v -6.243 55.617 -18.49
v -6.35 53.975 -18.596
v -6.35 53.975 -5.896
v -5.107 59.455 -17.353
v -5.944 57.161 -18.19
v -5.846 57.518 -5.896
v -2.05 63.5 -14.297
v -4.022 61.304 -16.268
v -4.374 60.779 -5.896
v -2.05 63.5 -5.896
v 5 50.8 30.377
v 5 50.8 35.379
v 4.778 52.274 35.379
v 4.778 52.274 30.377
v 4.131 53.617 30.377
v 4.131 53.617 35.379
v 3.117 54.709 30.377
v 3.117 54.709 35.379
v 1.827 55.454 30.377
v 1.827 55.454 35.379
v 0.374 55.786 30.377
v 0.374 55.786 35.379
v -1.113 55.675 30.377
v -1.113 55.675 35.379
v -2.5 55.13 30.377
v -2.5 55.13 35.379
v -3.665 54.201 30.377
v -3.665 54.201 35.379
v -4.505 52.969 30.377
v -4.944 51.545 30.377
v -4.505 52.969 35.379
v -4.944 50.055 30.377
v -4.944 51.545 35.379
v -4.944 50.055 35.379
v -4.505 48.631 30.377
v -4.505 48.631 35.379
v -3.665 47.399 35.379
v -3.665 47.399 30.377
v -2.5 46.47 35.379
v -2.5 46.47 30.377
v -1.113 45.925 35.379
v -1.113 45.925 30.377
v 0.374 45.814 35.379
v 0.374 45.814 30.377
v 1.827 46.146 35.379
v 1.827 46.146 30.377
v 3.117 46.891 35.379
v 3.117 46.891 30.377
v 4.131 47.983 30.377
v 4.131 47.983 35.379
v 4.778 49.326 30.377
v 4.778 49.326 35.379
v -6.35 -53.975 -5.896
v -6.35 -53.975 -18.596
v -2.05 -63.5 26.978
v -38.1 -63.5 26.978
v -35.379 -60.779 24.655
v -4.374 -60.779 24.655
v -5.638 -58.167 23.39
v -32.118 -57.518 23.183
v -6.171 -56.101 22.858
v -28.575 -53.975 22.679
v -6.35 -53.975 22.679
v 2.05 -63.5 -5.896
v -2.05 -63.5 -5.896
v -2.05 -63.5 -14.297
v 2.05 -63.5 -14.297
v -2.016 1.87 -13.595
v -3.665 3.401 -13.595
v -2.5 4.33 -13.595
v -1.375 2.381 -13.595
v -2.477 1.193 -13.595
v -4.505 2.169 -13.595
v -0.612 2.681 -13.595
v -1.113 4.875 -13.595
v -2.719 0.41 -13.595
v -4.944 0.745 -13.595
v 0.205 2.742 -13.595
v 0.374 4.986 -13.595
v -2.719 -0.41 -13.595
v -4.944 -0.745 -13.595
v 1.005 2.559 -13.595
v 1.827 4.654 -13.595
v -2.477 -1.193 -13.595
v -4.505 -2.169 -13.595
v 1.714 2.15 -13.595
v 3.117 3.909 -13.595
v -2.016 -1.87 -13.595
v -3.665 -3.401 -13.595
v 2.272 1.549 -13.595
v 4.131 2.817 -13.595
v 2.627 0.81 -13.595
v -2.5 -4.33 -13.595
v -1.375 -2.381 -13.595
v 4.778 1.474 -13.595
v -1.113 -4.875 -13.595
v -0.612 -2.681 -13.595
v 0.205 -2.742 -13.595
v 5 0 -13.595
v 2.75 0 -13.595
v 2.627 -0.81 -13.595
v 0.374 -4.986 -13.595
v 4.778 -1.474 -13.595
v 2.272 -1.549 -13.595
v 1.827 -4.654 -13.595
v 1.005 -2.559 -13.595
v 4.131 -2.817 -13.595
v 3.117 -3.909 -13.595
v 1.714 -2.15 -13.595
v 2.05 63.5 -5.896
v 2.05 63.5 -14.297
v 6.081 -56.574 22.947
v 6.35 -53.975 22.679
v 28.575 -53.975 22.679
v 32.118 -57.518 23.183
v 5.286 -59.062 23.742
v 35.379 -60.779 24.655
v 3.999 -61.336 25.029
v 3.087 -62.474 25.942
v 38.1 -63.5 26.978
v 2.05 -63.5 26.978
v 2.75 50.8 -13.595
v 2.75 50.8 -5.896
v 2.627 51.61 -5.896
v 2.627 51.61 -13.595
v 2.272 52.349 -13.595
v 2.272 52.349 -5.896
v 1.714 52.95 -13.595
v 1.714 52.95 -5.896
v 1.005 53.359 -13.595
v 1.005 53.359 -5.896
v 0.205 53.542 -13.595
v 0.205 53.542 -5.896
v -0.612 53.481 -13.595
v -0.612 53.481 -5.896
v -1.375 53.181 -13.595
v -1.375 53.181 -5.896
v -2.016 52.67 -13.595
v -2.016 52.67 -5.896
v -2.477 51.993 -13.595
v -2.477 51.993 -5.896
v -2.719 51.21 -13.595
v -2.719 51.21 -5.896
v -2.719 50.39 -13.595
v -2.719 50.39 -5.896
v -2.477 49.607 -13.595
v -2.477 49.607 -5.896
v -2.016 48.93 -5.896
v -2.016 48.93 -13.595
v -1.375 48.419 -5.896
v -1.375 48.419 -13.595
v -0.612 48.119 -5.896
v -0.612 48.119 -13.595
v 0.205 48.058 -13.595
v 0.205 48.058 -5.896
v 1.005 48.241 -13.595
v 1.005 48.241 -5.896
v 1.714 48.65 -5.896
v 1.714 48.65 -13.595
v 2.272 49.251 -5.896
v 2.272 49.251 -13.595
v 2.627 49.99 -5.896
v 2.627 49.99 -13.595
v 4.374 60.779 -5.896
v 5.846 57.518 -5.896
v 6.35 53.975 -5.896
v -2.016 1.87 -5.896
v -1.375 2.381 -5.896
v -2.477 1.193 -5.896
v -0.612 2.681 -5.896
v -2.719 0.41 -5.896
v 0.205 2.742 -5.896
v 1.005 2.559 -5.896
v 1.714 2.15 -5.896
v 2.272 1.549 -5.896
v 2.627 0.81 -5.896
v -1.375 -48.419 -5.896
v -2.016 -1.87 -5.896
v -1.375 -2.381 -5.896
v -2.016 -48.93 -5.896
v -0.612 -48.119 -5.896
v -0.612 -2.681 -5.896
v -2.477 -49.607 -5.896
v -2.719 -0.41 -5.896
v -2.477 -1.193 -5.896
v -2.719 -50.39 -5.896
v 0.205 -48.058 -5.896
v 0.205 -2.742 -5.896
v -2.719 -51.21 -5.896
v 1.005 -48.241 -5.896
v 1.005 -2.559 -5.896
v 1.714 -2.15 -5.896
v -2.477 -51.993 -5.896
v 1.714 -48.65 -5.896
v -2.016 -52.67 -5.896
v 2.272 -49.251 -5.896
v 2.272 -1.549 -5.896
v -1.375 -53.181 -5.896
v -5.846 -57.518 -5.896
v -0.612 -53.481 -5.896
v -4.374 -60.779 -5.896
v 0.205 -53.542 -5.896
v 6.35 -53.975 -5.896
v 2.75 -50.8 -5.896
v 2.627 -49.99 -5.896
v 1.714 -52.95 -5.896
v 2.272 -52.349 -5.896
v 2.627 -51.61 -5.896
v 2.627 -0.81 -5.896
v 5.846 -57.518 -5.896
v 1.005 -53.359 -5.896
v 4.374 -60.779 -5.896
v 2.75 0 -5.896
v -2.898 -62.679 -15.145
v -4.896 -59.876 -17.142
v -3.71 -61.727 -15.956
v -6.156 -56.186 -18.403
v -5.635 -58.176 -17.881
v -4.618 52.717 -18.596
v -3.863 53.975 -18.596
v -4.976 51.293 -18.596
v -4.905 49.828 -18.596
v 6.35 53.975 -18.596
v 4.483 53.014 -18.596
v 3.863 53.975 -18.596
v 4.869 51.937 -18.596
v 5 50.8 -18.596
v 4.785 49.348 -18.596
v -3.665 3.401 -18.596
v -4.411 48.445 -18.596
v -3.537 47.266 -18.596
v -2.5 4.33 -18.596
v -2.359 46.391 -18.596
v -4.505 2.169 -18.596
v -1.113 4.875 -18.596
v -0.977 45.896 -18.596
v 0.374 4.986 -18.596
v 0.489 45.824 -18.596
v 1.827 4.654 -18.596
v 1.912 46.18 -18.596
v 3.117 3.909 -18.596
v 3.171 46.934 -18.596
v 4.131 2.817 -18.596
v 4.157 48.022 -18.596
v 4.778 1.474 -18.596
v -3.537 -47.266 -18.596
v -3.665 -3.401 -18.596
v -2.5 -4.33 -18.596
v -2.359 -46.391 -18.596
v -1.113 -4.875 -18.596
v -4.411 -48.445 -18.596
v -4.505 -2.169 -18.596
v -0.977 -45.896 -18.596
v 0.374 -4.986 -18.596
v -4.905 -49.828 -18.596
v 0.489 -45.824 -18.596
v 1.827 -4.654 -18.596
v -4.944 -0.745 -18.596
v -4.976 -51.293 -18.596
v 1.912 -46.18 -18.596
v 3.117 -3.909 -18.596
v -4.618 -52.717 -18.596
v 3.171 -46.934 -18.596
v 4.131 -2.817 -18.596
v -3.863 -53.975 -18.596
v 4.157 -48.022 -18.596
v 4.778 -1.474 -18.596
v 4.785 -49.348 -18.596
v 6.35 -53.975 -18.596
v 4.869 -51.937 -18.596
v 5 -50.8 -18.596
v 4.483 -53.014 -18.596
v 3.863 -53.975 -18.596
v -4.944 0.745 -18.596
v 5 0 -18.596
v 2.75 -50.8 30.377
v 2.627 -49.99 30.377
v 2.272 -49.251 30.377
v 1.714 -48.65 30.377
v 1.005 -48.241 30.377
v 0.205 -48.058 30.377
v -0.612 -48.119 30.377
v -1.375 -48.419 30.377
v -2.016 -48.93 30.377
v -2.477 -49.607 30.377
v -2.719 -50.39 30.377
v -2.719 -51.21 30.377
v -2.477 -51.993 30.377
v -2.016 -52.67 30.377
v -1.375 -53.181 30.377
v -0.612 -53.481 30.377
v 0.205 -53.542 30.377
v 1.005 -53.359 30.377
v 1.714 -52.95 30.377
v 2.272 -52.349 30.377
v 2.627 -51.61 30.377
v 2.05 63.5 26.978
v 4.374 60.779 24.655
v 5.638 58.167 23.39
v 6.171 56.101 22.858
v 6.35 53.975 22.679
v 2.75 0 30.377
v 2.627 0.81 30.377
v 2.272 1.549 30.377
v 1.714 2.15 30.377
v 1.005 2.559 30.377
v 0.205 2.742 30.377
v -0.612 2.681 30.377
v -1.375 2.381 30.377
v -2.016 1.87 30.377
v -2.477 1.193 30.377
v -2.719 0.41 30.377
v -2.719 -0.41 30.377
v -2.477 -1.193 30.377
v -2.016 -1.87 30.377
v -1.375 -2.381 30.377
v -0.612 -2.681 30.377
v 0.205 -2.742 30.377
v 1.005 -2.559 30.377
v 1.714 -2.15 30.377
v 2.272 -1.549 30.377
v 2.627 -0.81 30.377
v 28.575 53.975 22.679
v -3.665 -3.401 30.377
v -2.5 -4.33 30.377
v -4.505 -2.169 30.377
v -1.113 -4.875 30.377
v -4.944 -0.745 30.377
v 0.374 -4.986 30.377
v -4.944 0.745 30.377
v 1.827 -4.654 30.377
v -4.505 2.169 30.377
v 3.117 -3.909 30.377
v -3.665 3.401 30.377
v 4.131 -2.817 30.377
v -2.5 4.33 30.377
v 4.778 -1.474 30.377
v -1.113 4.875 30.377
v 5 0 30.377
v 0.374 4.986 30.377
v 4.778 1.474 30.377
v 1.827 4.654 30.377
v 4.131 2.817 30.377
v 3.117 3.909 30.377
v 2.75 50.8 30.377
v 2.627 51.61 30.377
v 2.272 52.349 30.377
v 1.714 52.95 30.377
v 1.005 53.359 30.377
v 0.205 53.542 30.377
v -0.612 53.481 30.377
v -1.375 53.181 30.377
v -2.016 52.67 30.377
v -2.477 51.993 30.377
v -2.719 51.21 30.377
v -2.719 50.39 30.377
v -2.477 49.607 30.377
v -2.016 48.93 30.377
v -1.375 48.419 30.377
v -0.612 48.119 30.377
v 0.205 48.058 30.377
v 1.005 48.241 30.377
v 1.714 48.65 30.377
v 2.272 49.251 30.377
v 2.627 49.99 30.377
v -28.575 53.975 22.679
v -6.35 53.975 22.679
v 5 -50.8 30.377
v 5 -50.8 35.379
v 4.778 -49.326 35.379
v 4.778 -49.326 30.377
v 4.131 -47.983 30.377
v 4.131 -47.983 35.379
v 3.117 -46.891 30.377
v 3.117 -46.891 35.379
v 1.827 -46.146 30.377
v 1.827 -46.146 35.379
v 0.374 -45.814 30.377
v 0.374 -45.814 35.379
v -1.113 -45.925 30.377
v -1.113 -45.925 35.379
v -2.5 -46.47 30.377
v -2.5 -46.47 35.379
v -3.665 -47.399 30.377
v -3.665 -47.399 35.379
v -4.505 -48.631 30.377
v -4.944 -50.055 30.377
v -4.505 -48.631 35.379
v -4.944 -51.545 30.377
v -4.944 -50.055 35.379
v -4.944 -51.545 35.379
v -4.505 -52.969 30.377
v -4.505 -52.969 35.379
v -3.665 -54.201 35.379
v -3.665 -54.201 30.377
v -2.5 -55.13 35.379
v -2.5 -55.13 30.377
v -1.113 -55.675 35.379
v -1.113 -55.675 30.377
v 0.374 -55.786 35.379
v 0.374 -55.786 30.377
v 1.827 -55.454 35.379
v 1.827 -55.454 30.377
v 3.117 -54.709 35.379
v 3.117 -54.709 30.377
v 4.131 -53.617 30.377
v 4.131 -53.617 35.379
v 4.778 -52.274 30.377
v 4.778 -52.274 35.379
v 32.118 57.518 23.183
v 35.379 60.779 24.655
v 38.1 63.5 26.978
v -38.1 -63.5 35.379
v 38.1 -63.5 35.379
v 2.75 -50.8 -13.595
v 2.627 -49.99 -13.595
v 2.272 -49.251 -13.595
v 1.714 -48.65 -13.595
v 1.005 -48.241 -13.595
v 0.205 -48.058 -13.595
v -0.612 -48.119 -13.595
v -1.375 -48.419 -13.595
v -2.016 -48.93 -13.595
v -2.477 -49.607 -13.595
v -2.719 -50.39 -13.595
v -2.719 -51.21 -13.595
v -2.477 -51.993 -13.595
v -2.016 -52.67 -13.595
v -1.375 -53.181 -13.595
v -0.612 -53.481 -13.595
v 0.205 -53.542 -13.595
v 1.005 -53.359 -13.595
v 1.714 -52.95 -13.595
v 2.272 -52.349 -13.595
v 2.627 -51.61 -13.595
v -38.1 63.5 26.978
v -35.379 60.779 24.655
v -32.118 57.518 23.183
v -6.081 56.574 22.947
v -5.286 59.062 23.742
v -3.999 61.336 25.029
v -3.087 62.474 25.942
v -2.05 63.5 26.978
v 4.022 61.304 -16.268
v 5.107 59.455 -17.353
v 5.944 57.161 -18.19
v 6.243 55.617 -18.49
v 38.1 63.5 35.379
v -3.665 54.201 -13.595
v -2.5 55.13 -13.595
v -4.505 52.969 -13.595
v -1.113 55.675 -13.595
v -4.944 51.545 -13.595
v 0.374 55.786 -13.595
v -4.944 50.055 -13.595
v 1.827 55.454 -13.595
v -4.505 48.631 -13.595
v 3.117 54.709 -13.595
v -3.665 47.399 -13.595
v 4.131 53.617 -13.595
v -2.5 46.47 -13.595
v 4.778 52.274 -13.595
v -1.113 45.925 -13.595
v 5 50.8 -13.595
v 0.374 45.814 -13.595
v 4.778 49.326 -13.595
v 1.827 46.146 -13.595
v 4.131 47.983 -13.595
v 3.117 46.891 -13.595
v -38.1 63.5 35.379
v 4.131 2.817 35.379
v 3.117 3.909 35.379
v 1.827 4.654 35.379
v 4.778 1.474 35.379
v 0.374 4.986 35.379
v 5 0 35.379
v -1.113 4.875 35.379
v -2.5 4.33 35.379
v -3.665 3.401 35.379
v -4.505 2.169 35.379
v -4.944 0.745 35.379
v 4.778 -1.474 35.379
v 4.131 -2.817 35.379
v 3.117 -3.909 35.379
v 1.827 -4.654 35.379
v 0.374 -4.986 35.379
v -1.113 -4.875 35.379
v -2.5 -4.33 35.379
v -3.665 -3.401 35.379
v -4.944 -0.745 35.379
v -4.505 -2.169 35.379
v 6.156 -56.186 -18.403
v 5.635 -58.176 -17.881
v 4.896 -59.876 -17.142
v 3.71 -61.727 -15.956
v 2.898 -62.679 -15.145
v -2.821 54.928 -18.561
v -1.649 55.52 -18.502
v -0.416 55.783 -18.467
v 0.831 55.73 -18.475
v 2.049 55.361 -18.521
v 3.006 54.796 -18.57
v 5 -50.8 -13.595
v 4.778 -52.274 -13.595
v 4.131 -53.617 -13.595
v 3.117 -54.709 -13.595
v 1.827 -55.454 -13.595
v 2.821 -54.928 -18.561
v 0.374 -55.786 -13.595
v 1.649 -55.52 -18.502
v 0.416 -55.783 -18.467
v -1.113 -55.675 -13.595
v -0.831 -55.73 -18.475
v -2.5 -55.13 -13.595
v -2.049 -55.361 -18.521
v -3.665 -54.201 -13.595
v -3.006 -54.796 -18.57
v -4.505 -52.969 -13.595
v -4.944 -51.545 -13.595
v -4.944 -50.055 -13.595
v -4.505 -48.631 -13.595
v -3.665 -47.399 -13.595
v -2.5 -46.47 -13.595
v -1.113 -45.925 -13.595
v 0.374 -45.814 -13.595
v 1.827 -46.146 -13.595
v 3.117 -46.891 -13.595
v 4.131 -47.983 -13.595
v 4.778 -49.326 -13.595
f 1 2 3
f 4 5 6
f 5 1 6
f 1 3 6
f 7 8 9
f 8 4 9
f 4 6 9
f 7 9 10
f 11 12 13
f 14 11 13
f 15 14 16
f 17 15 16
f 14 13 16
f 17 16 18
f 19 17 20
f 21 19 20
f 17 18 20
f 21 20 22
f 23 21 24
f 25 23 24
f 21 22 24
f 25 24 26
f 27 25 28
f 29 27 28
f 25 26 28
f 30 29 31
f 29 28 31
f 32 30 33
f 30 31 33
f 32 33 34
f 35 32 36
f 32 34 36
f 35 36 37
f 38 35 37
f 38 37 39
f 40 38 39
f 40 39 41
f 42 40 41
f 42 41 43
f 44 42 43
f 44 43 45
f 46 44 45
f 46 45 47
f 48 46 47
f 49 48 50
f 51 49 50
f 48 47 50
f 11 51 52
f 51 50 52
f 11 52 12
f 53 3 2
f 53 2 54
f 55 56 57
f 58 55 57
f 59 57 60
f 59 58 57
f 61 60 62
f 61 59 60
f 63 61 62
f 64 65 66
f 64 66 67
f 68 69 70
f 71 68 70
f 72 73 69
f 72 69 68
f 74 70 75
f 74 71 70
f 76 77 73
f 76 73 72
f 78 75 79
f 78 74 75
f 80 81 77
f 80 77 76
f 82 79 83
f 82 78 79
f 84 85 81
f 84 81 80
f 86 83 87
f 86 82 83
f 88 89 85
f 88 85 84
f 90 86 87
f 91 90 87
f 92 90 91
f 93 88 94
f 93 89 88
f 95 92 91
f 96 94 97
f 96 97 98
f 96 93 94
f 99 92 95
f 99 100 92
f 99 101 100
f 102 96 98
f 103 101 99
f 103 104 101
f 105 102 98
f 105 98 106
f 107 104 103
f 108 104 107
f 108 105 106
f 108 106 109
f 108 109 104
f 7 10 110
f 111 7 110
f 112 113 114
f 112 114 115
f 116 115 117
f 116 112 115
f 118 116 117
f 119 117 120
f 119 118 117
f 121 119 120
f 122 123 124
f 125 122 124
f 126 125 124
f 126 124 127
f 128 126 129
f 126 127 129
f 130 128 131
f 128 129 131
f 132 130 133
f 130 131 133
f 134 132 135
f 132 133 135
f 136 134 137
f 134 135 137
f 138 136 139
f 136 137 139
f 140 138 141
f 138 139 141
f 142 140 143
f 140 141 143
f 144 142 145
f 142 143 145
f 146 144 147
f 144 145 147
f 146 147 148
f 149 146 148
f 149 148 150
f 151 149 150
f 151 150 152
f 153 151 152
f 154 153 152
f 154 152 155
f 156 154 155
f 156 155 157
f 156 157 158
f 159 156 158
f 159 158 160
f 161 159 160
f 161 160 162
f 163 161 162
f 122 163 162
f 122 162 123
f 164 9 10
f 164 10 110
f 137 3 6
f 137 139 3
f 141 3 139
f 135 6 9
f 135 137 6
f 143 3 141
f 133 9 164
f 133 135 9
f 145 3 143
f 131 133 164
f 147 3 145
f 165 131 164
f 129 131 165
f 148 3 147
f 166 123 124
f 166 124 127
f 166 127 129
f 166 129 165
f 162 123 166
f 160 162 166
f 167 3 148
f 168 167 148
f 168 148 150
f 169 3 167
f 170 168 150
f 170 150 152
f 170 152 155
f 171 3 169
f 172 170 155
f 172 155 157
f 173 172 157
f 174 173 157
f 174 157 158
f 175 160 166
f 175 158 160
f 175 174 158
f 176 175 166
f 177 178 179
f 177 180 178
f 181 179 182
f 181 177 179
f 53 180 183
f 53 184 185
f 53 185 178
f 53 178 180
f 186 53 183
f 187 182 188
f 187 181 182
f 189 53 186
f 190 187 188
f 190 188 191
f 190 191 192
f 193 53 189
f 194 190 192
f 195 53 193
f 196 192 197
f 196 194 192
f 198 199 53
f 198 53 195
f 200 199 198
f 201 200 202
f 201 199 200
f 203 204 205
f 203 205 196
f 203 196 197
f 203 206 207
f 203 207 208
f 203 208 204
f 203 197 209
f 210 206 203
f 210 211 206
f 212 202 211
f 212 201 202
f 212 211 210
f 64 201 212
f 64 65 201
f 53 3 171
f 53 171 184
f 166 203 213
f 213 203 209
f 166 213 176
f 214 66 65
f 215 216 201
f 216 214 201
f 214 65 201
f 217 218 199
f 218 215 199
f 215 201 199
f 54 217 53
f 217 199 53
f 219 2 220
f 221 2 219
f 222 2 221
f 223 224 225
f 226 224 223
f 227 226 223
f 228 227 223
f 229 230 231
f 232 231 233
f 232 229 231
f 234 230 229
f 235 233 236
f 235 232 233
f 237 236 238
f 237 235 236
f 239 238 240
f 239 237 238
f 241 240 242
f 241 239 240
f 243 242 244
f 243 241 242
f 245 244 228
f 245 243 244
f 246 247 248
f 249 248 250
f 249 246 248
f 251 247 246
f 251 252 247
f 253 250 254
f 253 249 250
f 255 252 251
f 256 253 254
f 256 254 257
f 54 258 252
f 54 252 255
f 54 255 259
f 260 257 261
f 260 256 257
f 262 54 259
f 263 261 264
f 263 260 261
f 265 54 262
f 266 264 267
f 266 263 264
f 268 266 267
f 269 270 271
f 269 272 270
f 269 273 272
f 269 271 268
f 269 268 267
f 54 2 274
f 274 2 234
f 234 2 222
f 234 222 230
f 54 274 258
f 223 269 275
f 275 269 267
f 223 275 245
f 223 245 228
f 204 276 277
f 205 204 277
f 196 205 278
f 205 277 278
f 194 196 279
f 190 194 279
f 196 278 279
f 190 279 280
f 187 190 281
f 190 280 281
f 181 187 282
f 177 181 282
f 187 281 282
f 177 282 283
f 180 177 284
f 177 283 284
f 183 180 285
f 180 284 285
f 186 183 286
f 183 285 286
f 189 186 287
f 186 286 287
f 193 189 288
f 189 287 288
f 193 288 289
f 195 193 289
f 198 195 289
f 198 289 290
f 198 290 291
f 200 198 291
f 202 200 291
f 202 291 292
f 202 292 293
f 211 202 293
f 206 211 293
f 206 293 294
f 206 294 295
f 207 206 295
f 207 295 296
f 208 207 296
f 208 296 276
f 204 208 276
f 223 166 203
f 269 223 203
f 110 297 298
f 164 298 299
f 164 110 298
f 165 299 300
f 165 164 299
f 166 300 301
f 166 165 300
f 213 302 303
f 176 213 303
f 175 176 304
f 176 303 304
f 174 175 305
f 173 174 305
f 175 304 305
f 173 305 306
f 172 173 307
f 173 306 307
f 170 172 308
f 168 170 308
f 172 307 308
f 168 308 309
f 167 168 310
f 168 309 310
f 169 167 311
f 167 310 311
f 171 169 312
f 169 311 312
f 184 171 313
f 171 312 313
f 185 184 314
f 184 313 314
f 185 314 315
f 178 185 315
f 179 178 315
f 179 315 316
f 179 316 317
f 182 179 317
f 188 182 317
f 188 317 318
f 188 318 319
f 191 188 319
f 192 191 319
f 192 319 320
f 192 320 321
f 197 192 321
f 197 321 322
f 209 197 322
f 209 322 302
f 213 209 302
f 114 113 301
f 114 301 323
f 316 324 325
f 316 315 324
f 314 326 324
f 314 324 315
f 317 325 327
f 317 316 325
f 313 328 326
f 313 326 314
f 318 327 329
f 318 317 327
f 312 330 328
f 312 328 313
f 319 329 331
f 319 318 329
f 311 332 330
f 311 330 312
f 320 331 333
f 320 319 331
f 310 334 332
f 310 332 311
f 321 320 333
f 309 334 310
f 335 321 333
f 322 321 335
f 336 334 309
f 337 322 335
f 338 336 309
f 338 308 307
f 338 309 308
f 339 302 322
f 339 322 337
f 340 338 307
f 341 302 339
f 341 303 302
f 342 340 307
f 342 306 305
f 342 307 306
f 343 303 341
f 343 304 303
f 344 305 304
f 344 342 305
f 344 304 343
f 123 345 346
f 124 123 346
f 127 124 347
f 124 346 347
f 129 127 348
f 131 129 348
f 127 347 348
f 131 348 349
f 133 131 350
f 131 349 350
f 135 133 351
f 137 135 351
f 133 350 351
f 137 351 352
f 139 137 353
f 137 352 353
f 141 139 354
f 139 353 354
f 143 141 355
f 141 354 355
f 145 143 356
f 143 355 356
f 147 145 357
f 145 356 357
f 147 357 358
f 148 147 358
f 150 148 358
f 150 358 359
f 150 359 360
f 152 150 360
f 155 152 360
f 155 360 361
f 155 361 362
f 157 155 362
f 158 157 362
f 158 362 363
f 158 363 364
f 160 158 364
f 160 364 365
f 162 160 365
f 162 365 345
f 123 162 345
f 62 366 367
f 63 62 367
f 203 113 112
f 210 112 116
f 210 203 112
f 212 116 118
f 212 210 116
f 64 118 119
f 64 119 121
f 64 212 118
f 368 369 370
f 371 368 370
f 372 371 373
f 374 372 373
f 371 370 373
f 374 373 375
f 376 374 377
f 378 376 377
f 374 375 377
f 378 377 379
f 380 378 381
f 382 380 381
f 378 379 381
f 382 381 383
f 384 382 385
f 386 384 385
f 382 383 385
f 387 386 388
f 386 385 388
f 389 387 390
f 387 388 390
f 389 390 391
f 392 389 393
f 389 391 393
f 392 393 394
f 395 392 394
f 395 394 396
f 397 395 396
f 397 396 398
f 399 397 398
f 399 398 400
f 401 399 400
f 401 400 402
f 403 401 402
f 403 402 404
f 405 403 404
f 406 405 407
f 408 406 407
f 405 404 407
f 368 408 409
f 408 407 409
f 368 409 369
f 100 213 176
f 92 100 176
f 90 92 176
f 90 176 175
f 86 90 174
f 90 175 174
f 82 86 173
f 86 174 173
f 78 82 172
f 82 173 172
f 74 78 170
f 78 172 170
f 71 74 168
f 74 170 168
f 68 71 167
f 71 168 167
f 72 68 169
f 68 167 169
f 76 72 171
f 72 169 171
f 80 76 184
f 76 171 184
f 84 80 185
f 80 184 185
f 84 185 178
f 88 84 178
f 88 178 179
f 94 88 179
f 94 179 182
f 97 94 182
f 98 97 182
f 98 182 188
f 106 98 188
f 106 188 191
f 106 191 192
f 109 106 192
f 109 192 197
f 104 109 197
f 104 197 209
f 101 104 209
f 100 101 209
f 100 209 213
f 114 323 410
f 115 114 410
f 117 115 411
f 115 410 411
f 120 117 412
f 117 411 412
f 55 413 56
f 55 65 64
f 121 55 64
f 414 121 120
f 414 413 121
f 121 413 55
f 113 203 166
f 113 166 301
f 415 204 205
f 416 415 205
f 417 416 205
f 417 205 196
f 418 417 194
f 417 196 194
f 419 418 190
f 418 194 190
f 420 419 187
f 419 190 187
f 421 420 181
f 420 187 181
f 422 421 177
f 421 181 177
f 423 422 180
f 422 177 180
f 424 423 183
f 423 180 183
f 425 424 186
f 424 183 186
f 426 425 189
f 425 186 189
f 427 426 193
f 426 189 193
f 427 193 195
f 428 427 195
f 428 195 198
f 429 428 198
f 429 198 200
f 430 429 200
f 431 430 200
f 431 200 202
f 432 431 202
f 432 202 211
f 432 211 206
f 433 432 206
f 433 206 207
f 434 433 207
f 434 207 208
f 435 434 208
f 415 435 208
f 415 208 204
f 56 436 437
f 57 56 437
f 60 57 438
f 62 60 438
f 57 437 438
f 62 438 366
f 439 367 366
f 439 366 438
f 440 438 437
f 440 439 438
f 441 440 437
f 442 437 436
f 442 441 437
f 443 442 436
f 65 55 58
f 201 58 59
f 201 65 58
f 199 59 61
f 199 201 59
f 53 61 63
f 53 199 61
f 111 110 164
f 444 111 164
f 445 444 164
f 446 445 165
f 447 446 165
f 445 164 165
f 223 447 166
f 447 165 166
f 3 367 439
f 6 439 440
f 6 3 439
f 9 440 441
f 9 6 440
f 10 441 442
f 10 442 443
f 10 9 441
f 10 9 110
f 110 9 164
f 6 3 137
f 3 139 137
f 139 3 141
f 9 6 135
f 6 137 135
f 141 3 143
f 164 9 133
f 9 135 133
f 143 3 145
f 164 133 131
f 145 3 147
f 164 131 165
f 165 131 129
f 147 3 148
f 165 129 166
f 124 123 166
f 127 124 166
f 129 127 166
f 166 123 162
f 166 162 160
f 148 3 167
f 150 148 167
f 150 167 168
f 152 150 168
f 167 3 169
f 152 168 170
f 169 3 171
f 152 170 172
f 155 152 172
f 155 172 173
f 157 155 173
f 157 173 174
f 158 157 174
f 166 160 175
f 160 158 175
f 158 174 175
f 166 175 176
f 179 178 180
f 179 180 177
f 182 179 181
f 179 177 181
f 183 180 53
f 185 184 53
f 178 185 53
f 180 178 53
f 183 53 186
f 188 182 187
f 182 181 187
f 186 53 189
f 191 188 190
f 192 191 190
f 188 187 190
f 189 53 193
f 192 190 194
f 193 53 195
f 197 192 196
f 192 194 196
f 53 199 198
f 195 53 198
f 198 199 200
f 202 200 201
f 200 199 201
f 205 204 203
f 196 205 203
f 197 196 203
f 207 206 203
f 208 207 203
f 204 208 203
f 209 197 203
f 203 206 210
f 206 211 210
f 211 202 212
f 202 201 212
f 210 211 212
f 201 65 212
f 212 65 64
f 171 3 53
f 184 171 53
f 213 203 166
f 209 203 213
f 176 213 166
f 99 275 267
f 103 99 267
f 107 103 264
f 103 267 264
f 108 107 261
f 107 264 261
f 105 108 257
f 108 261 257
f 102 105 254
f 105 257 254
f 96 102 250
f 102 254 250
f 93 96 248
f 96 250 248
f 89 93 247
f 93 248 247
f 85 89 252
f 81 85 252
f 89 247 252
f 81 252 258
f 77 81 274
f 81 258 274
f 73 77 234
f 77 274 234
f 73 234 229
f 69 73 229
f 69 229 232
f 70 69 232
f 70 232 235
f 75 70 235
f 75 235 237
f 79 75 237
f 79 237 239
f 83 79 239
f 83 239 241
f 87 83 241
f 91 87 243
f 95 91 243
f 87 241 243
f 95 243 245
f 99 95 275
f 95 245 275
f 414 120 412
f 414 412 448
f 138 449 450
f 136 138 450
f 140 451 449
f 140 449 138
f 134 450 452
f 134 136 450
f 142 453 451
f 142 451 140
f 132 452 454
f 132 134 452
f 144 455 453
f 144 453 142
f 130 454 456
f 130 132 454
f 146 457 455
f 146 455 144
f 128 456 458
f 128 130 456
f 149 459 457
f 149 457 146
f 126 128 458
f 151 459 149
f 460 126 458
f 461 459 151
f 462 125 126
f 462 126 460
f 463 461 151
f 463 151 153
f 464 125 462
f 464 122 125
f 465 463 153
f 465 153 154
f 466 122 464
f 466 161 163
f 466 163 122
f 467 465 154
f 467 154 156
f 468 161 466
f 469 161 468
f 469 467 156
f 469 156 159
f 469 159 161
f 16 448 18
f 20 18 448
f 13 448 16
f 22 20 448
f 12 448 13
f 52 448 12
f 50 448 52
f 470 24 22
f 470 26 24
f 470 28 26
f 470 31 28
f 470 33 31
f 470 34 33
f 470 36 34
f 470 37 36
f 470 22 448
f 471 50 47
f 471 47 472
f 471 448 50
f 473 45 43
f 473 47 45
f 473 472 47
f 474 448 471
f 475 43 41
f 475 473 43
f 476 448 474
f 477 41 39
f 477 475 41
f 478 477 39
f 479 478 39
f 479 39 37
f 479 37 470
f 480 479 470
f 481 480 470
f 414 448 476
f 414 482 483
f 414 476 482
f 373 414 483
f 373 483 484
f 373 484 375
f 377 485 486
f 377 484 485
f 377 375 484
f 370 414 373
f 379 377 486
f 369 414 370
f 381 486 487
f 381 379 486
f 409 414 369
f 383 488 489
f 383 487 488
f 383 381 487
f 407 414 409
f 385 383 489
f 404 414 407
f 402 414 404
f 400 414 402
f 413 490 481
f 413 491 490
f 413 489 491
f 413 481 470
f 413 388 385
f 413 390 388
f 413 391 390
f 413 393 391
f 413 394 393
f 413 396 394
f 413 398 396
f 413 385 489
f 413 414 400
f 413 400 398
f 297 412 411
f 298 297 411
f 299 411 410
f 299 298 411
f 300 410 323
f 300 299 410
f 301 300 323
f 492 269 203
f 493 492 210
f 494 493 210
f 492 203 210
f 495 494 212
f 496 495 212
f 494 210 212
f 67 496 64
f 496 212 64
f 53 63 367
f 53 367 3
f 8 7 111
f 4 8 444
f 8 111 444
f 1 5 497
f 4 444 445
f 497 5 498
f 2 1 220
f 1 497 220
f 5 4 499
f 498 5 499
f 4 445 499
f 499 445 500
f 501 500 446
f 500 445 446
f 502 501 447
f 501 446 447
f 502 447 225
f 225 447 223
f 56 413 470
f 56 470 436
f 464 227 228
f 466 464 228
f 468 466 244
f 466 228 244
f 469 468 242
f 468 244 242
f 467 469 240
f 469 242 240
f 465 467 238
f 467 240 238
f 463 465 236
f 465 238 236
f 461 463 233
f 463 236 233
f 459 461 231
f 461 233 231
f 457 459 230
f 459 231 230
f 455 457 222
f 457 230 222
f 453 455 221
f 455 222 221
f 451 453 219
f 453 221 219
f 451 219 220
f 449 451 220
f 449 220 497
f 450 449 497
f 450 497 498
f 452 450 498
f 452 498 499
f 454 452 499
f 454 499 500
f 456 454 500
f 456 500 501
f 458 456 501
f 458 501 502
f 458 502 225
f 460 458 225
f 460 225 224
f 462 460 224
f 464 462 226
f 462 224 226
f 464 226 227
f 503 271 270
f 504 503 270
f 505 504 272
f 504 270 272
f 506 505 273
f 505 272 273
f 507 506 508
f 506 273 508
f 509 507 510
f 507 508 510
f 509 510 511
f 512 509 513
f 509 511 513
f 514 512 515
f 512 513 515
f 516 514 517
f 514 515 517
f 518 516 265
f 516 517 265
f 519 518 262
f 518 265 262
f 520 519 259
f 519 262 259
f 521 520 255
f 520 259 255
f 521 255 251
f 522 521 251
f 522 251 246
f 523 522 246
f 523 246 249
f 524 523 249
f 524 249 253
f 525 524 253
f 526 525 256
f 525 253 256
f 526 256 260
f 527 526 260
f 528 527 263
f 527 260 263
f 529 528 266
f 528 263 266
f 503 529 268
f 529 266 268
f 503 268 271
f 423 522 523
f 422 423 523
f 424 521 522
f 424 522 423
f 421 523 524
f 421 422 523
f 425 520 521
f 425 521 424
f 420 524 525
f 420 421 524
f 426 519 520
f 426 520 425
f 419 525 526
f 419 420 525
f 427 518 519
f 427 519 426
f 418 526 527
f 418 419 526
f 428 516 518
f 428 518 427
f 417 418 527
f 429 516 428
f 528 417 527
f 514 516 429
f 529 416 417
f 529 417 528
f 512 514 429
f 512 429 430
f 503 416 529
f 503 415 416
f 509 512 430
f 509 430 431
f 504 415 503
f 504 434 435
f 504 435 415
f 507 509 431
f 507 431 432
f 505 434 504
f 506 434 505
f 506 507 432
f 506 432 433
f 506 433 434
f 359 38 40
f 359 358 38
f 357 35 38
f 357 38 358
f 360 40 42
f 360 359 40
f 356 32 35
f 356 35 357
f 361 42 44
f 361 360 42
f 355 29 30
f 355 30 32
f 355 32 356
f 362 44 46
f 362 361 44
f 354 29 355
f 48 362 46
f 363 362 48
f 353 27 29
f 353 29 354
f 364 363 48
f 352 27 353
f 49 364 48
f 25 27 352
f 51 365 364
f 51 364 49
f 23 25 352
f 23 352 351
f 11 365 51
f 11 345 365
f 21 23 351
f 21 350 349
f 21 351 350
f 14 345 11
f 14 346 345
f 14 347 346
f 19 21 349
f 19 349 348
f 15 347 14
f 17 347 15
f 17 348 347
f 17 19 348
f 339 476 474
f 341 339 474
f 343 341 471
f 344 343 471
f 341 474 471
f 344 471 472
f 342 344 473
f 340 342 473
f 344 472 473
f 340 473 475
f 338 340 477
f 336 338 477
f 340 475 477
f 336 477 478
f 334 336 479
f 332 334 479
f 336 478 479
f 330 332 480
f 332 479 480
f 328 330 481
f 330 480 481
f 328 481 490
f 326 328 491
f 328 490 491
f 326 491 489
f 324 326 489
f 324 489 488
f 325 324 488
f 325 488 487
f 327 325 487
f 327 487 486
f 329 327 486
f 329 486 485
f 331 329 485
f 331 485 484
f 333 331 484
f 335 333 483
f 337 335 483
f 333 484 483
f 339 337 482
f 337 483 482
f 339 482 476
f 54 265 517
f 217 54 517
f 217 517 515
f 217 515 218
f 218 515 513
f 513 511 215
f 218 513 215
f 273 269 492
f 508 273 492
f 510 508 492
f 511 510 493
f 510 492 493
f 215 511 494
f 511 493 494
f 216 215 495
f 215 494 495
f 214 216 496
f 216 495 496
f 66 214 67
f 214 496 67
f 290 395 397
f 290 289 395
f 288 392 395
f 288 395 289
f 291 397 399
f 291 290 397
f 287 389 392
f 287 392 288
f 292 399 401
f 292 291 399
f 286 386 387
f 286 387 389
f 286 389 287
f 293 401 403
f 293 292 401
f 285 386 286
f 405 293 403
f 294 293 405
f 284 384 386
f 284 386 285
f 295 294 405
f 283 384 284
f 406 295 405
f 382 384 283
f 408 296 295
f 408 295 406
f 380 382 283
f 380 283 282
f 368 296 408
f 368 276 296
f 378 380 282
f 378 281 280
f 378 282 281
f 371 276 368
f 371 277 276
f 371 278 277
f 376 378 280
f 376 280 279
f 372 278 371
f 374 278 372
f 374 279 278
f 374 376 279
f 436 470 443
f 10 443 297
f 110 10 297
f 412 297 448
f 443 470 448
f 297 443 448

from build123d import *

# Parameters (mm, degrees)
F1_DEPTH  = 63.5
F2_W      = 12.7
F2_H      = 127
F3_DEPTH  = 12.7
F4_R      = 4.99999
F5_DEPTH  = 5.00126
F6_R      = 4.99999
F7_DEPTH  = 5.00126
F8_R      = 2.74955
F9_DEPTH  = 48.97474
F15_DEPTH = 25.4
F17_DEPTH = 127.001
F19_DEPTH = 44.451


with BuildPart() as f1:
    # F0 (on Front) → F1 (new body, symmetric)
    with BuildSketch(Plane.XZ):
        Polygon((-6.35, 22.6785714286), (-6.35, -5.8964285714), (6.35, -5.8964285714), (6.35, 22.6785714286), (38.1, 22.6785714286), (38.1, 35.3785714286), (-38.1, 35.3785714286), (-38.1, 22.6785714286), align=None)
    extrude(amount=F1_DEPTH, both=True)

    # F4 (on face) → F5 (cut)
    with BuildSketch(Plane.XY.offset(35.3785714286)):
        with Locations((0, 50.8)):
            Circle(F4_R)
        with Locations((0, -50.8)):
            Circle(F4_R)
        Circle(F4_R)
    extrude(amount=-F5_DEPTH, mode=Mode.SUBTRACT)


with BuildPart() as f3:
    # F2 (on face) → F3 (new body)
    with BuildSketch(Plane(origin=(0, 0, -5.8964285714), x_dir=(1, 0, 0), z_dir=(0, 0, -1))):
        Rectangle(F2_W, F2_H)
    extrude(amount=F3_DEPTH)

    # F6 (on face) → F7 (cut)
    with BuildSketch(Plane(origin=(0, 0, -18.5964285714), x_dir=(1, 0, 0), z_dir=(0, 0, -1))):
        Circle(F6_R)
        with Locations((0, -50.8)):
            Circle(F6_R)
        with Locations((0, 50.8)):
            Circle(F6_R)
    extrude(amount=-F7_DEPTH, mode=Mode.SUBTRACT)


with BuildPart() as f9_tool:
    # F8 (on face) → F9 (new body, through all)
    with BuildSketch(Plane.XY.offset(30.3773114286)):
        Circle(F8_R)
        with Locations((0, 50.8)):
            Circle(F8_R)
        with Locations((0, -50.8)):
            Circle(F8_R)
    extrude(amount=-F9_DEPTH)


with BuildPart() as f1_1:
    add(f1.part)

    # F9: cut by f9_tool
    add(f9_tool.part, mode=Mode.SUBTRACT)

    # F11: sweep along a path in F11_path
    with BuildLine(Plane(origin=(38.1, -63.5, 22.6785714286), x_dir=(0, 0, -1), z_dir=(0, 1, 0))) as f11_path:
        Line((0, 0), (0, 31.75))
        Line((0, 31.75), (28.575, 31.75))
    # F10 (on face) → F11 (sweep, cut)
    with BuildSketch(Plane.YZ.offset(38.1)):
        with BuildLine():
            ThreePointArc((-53.975, 22.6785714286), (-59.2002604126, 23.8033110159), (-63.5, 26.9783110159))
            Line((-63.5, 26.9783110159), (-63.5, 22.6785714286))
            Line((-63.5, 22.6785714286), (-53.975, 22.6785714286))
        make_face()
        with BuildLine():
            ThreePointArc((63.5, 26.9783110159), (59.2002604126, 23.8033110159), (53.975, 22.6785714286))
            Line((53.975, 22.6785714286), (63.5, 22.6785714286))
            Line((63.5, 22.6785714286), (63.5, 26.9783110159))
        make_face()
    sweep(path=f11_path.line, transition=Transition.RIGHT, mode=Mode.SUBTRACT)

    # F13: sweep along a path in F13_path
    with BuildLine(Plane(origin=(-38.1, -63.5, 22.6785714286), x_dir=(0, 0, 1), z_dir=(0, -1, 0))) as f13_path:
        Line((0, 0), (0, -31.75))
        Line((0, -31.75), (-28.575, -31.75))
    # F12 (on face) → F13 (sweep, cut)
    with BuildSketch(Plane(origin=(-38.1, 0, 0), x_dir=(0, -1, 0), z_dir=(-1, 0, 0))):
        with BuildLine():
            Line((53.975, 22.6785714286), (63.5, 22.6785714286))
            Line((63.5, 22.6785714286), (63.5, 26.9783110159))
            ThreePointArc((63.5, 26.9783110159), (59.2002604126, 23.8033110159), (53.975, 22.6785714286))
        make_face()
        with BuildLine():
            Line((-63.5, 26.9783110159), (-63.5, 22.6785714286))
            Line((-63.5, 22.6785714286), (-53.975, 22.6785714286))
            ThreePointArc((-53.975, 22.6785714286), (-59.2002604126, 23.8033110159), (-63.5, 26.9783110159))
        make_face()
    sweep(path=f13_path.line, transition=Transition.RIGHT, mode=Mode.SUBTRACT)

    # F16 (on face) → F17 (cut, through all)
    with BuildSketch(Plane(origin=(0, 63.5, 0), x_dir=(-1, 0, 0), z_dir=(0, 1, 0))):
        with BuildLine():
            ThreePointArc((-28.575, 22.6785714286), (-33.8002604126, 23.8033110159), (-38.1, 26.9783110159))
            Line((-38.1, 26.9783110159), (-38.1, 22.6785714286))
            Line((-38.1, 22.6785714286), (-28.575, 22.6785714286))
        make_face()
        with BuildLine():
            ThreePointArc((38.1, 26.9783110159), (33.8002604126, 23.8033110159), (28.575, 22.6785714286))
            Line((28.575, 22.6785714286), (38.1, 22.6785714286))
            Line((38.1, 22.6785714286), (38.1, 26.9783110159))
        make_face()
    extrude(amount=-F17_DEPTH, mode=Mode.SUBTRACT)


with BuildPart() as f3_1:
    add(f3.part)

    # F9: cut by f9_tool
    add(f9_tool.part, mode=Mode.SUBTRACT)

    # F14 (on face) → F15 (cut)
    with BuildSketch(Plane.XY.offset(-5.8964285714)):
        with BuildLine():
            Line((-6.35, 63.5), (-6.35, 53.975))
            ThreePointArc((-6.35, 53.975), (-5.2252604126, 59.2002604126), (-2.0502604126, 63.5))
            Line((-2.0502604126, 63.5), (-6.35, 63.5))
        make_face()
        with BuildLine():
            Line((-6.35, -53.975), (-6.35, -63.5))
            Line((-6.35, -63.5), (-2.0502604126, -63.5))
            ThreePointArc((-2.0502604126, -63.5), (-5.2252604126, -59.2002604126), (-6.35, -53.975))
        make_face()
        with BuildLine():
            Line((2.0502604126, -63.5), (6.35, -63.5))
            Line((6.35, -63.5), (6.35, -53.975))
            ThreePointArc((6.35, -53.975), (5.2252604126, -59.2002604126), (2.0502604126, -63.5))
        make_face()
        with BuildLine():
            Line((6.35, 63.5), (2.0502604126, 63.5))
            ThreePointArc((2.0502604126, 63.5), (5.2252604126, 59.2002604126), (6.35, 53.975))
            Line((6.35, 53.975), (6.35, 63.5))
        make_face()
    extrude(amount=-F15_DEPTH, mode=Mode.SUBTRACT)

    # F18 (on face) → F19 (cut, through all)
    with BuildSketch(Plane.YZ.offset(6.35)):
        with BuildLine():
            ThreePointArc((-53.975, -18.5964285714), (-59.2002604126, -17.4716889841), (-63.5, -14.2966889841))
            Line((-63.5, -14.2966889841), (-63.5, -18.5964285714))
            Line((-63.5, -18.5964285714), (-53.975, -18.5964285714))
        make_face()
        with BuildLine():
            Line((63.5, -18.5964285714), (63.5, -14.2966889841))
            ThreePointArc((63.5, -14.2966889841), (59.2002604126, -17.4716889841), (53.975, -18.5964285714))
            Line((53.975, -18.5964285714), (63.5, -18.5964285714))
        make_face()
    extrude(amount=-F19_DEPTH, mode=Mode.SUBTRACT)


solid = Compound([f1_1.part, f3_1.part])
